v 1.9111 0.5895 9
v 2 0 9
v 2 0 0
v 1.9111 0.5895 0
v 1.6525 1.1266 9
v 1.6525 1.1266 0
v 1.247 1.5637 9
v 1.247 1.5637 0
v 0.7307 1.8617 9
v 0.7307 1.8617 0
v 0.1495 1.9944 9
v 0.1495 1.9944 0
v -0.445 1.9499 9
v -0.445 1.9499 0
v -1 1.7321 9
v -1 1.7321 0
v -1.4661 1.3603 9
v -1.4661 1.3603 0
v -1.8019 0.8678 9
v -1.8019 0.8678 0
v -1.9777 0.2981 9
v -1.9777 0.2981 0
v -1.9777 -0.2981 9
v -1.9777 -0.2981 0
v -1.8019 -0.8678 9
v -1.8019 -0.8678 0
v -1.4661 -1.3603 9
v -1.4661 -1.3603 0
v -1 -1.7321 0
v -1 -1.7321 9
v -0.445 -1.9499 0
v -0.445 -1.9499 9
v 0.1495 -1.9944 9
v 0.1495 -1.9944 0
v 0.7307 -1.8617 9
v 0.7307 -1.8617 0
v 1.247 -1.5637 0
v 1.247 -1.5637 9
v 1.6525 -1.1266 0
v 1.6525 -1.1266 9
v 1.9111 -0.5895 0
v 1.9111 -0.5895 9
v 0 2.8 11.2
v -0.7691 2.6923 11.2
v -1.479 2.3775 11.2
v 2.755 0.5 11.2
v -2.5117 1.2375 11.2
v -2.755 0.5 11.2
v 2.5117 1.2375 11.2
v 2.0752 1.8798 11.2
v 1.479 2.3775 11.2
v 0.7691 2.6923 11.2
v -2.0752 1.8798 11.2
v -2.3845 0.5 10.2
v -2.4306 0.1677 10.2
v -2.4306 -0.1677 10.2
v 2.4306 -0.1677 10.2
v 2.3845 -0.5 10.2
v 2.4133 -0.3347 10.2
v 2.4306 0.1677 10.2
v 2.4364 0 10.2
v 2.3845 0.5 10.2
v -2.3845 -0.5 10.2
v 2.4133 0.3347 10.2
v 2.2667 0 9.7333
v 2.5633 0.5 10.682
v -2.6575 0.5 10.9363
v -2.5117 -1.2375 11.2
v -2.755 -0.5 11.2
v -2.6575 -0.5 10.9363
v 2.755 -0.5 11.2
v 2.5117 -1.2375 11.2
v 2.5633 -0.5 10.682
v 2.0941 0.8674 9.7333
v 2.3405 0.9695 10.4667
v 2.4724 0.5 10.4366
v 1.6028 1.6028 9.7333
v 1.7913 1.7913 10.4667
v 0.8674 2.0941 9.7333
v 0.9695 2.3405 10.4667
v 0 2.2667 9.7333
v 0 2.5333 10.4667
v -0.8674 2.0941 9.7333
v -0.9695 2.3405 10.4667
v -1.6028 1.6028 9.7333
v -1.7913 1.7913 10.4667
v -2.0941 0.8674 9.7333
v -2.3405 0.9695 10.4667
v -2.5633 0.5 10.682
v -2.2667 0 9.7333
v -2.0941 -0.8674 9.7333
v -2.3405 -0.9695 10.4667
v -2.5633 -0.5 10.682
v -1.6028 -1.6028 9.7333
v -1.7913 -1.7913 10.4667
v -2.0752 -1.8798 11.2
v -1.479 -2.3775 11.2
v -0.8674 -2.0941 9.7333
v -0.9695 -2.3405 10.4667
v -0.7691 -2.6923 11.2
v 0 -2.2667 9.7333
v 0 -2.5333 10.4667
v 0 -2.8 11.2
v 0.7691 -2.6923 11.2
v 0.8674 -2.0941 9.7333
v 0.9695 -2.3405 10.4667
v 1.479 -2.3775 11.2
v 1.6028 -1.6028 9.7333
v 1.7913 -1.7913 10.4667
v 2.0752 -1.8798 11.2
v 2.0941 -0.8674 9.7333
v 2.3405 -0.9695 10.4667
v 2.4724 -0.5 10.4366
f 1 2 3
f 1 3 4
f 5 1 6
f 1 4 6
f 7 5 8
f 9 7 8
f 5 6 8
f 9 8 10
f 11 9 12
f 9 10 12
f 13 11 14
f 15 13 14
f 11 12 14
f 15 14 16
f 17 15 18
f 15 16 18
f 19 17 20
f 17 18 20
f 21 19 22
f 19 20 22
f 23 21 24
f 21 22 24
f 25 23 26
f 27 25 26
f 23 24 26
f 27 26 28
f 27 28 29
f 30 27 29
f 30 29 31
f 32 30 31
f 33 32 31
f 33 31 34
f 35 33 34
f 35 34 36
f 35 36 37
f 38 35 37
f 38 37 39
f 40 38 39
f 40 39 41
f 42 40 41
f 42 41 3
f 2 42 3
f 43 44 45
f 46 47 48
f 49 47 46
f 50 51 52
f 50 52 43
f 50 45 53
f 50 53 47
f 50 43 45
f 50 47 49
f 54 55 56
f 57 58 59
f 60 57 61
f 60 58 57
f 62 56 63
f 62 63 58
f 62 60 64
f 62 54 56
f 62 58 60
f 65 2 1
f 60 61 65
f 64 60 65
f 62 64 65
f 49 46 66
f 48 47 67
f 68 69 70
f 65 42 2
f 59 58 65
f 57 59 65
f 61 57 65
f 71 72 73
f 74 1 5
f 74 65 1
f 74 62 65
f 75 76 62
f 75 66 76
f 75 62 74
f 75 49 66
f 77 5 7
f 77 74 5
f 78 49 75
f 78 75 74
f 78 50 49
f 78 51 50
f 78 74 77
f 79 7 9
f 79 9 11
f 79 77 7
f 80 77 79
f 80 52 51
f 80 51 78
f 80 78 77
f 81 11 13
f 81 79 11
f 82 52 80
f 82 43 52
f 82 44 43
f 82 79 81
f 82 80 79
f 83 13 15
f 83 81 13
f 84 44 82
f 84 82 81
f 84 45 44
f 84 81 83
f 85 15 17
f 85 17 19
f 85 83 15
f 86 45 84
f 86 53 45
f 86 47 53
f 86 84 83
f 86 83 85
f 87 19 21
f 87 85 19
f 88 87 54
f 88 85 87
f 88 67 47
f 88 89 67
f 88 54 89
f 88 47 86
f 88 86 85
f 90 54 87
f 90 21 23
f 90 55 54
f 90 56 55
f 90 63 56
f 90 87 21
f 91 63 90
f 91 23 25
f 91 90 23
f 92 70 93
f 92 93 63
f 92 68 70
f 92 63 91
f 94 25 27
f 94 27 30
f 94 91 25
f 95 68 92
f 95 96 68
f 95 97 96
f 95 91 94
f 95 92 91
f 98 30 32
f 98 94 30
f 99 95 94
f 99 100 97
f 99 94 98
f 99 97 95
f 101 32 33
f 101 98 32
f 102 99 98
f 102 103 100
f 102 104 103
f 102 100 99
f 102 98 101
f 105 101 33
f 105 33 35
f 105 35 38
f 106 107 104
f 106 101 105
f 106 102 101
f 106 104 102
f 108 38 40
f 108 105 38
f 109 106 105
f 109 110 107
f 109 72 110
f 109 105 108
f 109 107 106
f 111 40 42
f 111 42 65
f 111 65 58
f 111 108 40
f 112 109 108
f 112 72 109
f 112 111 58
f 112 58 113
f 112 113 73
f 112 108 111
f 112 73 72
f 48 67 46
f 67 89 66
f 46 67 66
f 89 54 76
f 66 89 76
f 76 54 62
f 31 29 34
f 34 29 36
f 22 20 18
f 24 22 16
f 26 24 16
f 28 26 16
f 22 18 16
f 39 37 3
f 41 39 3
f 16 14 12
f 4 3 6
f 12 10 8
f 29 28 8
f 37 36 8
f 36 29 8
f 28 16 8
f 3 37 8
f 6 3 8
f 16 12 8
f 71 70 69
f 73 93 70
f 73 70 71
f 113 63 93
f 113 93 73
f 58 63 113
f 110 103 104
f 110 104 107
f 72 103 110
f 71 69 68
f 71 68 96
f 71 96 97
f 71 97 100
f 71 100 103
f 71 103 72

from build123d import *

# Parameters (mm, degrees)
BOX_W          = 10
BOX_H          = 1
BOX_DEPTH      = 1
CYLINDER_R     = 2
CYLINDER_DEPTH = 10


with BuildPart() as cub:
    # Box → Box (new body)
    with BuildSketch(Plane(origin=(-4, -0.5, 10.2), x_dir=(1, 0, 0), z_dir=(0, 0, 1))):
        with Locations((5, 0.5)):
            Rectangle(BOX_W, BOX_H)
    extrude(amount=BOX_DEPTH)


with BuildPart() as cut:
    # Cone → Cone (revolve)
    with BuildSketch(Plane(origin=(0, 0, 9), x_dir=(1, 0, 0), z_dir=(0, -1, 0))):
        Polygon((0, 0), (2, 0), (2.8, 2.2), (0, 2.2), align=None)
    revolve(axis=Axis((0, 0, 9), (0, 0, 1)))

    # Cut: cut Cub
    add(cub.part, mode=Mode.SUBTRACT)


with BuildPart() as clau:
    # Cylinder → Cylinder (new body)
    with BuildSketch(Plane.XY):
        Circle(CYLINDER_R)
    extrude(amount=CYLINDER_DEPTH)

    # Fusion: union Cut
    add(cut.part)


solid = clau.part
